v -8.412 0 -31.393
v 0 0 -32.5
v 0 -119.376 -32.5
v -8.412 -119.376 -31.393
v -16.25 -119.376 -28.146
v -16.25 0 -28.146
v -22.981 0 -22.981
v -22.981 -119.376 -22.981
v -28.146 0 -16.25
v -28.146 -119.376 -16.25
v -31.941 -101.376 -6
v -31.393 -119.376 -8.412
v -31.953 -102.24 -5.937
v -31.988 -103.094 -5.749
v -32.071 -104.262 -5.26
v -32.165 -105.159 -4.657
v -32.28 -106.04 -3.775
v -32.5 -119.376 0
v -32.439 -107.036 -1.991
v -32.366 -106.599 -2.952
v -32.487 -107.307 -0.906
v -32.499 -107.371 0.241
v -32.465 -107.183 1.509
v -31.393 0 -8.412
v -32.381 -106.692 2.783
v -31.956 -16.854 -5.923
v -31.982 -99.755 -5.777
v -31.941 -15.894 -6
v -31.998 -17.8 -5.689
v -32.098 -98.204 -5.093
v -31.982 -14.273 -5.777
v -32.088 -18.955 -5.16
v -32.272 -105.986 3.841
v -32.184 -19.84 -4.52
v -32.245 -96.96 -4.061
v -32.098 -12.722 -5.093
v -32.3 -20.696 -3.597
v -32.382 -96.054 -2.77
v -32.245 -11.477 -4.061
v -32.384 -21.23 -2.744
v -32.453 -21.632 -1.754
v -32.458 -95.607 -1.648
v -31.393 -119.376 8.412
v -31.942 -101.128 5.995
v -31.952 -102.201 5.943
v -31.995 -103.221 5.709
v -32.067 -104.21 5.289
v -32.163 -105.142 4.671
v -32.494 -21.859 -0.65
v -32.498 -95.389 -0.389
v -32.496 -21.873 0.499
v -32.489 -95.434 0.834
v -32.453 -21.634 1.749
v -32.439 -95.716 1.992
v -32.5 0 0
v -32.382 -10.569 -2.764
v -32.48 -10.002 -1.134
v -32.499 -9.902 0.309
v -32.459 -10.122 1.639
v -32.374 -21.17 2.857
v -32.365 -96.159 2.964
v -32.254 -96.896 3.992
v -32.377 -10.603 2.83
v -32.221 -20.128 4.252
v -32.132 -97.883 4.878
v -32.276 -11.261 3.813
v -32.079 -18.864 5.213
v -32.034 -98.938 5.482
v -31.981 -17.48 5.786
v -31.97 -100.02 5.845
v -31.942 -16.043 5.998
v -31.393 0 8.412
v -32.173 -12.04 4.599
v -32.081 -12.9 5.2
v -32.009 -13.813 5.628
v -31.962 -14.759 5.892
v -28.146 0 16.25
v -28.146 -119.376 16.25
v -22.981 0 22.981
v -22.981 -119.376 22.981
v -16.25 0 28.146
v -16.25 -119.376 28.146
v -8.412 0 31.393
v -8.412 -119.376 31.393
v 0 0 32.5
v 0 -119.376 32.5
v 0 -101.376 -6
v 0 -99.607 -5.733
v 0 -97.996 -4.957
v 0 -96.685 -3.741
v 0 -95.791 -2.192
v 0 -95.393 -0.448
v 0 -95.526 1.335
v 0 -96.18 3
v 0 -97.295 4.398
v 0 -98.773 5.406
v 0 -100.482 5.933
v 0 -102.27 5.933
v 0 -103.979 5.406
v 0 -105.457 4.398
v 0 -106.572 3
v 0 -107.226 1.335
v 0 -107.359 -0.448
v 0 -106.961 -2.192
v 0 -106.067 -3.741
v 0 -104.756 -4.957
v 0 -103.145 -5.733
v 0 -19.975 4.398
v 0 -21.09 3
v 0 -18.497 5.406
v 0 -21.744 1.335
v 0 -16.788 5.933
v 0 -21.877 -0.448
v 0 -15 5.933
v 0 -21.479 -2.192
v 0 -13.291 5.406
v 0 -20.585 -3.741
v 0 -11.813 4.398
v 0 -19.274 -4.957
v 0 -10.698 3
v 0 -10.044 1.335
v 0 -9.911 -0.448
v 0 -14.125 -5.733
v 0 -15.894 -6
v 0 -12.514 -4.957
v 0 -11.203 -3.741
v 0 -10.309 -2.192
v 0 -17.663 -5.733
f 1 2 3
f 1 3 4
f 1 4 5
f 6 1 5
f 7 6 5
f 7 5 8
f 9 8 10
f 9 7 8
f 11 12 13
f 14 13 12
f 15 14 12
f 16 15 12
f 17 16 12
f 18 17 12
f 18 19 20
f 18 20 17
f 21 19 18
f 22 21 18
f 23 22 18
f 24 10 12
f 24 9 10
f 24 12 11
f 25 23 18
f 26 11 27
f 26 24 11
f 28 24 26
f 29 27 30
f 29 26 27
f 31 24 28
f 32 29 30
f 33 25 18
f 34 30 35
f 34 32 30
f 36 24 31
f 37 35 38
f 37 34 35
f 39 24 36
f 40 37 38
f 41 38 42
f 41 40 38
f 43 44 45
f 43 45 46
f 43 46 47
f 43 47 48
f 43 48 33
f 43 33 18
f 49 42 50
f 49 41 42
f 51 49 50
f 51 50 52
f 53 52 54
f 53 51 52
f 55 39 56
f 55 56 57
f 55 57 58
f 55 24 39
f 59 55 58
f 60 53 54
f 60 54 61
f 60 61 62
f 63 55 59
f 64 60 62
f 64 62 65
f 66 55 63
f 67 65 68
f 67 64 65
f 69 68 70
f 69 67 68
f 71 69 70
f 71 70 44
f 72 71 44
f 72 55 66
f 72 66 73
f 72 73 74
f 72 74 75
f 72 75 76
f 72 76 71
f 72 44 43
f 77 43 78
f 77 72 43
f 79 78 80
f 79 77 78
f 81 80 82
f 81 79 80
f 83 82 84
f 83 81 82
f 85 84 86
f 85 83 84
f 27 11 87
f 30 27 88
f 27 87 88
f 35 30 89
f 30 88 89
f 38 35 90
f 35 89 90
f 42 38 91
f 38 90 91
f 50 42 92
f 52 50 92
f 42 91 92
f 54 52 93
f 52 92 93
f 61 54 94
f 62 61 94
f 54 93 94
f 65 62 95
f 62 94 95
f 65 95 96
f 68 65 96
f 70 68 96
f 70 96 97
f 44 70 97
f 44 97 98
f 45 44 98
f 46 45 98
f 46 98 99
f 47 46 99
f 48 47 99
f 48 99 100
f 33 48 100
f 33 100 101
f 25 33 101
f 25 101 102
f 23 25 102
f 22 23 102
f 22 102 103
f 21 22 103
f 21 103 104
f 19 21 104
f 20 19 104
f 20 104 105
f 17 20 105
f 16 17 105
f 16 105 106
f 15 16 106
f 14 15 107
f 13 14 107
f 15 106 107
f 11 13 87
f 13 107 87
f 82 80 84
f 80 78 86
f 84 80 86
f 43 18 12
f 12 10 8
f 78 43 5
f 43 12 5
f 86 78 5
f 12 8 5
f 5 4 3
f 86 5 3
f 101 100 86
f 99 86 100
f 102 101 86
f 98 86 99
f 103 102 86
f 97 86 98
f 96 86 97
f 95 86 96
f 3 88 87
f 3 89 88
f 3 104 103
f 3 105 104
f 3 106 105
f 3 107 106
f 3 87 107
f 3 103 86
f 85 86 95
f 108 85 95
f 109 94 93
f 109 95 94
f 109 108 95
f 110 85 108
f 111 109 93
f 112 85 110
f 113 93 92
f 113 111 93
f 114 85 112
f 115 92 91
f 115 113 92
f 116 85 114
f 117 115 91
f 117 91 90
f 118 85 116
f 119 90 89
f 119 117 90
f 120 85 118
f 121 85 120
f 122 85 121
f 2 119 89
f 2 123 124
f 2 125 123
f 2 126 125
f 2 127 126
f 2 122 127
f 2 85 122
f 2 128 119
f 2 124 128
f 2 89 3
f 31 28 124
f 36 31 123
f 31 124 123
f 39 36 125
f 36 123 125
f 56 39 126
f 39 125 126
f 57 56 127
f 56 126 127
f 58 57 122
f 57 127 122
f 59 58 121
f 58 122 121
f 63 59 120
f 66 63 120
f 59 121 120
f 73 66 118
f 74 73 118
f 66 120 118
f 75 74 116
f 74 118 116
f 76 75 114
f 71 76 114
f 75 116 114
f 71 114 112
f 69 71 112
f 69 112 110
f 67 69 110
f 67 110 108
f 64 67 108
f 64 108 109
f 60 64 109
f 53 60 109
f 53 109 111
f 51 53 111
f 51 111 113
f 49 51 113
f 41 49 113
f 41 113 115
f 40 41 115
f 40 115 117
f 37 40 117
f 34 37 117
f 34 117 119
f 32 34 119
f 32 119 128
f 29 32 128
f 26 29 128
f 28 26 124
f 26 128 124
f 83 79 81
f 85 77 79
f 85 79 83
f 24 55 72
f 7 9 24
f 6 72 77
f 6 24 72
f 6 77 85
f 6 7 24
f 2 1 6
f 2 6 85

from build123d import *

# Parameters (mm, degrees)
BOSS_EXTRUDE1_DEPTH = 119.376
SKETCH2_R           = 6
CUT_EXTRUDE1_DEPTH  = 56
SKETCH3_R           = 6
CUT_EXTRUDE2_DEPTH  = 56


with BuildPart() as part:
    # Sketch1 → Boss-Extrude1 (new body)
    with BuildSketch(Plane(origin=(0, 0, 0), x_dir=(1, 0, 0), z_dir=(0, 1, 0))):
        with BuildLine():
            Line((0, -32.5), (0, 32.5))
            ThreePointArc((0, 32.5), (-32.5, 0), (0, -32.5))
        make_face()
    extrude(amount=-BOSS_EXTRUDE1_DEPTH)

    # Sketch2 → Cut-Extrude1 (cut)
    with BuildSketch(Plane(origin=(0, 0, 0), x_dir=(0, 0, -1), z_dir=(1, 0, 0))):
        with Locations((0, -15.894)):
            Circle(SKETCH2_R)
    extrude(amount=-CUT_EXTRUDE1_DEPTH, mode=Mode.SUBTRACT)

    # Sketch3 → Cut-Extrude2 (cut)
    with BuildSketch(Plane(origin=(0, 0, 0), x_dir=(0, 0, -1), z_dir=(1, 0, 0))):
        with Locations((0, -101.376)):
            Circle(SKETCH3_R)
    extrude(amount=-CUT_EXTRUDE2_DEPTH, mode=Mode.SUBTRACT)


solid = part.part
